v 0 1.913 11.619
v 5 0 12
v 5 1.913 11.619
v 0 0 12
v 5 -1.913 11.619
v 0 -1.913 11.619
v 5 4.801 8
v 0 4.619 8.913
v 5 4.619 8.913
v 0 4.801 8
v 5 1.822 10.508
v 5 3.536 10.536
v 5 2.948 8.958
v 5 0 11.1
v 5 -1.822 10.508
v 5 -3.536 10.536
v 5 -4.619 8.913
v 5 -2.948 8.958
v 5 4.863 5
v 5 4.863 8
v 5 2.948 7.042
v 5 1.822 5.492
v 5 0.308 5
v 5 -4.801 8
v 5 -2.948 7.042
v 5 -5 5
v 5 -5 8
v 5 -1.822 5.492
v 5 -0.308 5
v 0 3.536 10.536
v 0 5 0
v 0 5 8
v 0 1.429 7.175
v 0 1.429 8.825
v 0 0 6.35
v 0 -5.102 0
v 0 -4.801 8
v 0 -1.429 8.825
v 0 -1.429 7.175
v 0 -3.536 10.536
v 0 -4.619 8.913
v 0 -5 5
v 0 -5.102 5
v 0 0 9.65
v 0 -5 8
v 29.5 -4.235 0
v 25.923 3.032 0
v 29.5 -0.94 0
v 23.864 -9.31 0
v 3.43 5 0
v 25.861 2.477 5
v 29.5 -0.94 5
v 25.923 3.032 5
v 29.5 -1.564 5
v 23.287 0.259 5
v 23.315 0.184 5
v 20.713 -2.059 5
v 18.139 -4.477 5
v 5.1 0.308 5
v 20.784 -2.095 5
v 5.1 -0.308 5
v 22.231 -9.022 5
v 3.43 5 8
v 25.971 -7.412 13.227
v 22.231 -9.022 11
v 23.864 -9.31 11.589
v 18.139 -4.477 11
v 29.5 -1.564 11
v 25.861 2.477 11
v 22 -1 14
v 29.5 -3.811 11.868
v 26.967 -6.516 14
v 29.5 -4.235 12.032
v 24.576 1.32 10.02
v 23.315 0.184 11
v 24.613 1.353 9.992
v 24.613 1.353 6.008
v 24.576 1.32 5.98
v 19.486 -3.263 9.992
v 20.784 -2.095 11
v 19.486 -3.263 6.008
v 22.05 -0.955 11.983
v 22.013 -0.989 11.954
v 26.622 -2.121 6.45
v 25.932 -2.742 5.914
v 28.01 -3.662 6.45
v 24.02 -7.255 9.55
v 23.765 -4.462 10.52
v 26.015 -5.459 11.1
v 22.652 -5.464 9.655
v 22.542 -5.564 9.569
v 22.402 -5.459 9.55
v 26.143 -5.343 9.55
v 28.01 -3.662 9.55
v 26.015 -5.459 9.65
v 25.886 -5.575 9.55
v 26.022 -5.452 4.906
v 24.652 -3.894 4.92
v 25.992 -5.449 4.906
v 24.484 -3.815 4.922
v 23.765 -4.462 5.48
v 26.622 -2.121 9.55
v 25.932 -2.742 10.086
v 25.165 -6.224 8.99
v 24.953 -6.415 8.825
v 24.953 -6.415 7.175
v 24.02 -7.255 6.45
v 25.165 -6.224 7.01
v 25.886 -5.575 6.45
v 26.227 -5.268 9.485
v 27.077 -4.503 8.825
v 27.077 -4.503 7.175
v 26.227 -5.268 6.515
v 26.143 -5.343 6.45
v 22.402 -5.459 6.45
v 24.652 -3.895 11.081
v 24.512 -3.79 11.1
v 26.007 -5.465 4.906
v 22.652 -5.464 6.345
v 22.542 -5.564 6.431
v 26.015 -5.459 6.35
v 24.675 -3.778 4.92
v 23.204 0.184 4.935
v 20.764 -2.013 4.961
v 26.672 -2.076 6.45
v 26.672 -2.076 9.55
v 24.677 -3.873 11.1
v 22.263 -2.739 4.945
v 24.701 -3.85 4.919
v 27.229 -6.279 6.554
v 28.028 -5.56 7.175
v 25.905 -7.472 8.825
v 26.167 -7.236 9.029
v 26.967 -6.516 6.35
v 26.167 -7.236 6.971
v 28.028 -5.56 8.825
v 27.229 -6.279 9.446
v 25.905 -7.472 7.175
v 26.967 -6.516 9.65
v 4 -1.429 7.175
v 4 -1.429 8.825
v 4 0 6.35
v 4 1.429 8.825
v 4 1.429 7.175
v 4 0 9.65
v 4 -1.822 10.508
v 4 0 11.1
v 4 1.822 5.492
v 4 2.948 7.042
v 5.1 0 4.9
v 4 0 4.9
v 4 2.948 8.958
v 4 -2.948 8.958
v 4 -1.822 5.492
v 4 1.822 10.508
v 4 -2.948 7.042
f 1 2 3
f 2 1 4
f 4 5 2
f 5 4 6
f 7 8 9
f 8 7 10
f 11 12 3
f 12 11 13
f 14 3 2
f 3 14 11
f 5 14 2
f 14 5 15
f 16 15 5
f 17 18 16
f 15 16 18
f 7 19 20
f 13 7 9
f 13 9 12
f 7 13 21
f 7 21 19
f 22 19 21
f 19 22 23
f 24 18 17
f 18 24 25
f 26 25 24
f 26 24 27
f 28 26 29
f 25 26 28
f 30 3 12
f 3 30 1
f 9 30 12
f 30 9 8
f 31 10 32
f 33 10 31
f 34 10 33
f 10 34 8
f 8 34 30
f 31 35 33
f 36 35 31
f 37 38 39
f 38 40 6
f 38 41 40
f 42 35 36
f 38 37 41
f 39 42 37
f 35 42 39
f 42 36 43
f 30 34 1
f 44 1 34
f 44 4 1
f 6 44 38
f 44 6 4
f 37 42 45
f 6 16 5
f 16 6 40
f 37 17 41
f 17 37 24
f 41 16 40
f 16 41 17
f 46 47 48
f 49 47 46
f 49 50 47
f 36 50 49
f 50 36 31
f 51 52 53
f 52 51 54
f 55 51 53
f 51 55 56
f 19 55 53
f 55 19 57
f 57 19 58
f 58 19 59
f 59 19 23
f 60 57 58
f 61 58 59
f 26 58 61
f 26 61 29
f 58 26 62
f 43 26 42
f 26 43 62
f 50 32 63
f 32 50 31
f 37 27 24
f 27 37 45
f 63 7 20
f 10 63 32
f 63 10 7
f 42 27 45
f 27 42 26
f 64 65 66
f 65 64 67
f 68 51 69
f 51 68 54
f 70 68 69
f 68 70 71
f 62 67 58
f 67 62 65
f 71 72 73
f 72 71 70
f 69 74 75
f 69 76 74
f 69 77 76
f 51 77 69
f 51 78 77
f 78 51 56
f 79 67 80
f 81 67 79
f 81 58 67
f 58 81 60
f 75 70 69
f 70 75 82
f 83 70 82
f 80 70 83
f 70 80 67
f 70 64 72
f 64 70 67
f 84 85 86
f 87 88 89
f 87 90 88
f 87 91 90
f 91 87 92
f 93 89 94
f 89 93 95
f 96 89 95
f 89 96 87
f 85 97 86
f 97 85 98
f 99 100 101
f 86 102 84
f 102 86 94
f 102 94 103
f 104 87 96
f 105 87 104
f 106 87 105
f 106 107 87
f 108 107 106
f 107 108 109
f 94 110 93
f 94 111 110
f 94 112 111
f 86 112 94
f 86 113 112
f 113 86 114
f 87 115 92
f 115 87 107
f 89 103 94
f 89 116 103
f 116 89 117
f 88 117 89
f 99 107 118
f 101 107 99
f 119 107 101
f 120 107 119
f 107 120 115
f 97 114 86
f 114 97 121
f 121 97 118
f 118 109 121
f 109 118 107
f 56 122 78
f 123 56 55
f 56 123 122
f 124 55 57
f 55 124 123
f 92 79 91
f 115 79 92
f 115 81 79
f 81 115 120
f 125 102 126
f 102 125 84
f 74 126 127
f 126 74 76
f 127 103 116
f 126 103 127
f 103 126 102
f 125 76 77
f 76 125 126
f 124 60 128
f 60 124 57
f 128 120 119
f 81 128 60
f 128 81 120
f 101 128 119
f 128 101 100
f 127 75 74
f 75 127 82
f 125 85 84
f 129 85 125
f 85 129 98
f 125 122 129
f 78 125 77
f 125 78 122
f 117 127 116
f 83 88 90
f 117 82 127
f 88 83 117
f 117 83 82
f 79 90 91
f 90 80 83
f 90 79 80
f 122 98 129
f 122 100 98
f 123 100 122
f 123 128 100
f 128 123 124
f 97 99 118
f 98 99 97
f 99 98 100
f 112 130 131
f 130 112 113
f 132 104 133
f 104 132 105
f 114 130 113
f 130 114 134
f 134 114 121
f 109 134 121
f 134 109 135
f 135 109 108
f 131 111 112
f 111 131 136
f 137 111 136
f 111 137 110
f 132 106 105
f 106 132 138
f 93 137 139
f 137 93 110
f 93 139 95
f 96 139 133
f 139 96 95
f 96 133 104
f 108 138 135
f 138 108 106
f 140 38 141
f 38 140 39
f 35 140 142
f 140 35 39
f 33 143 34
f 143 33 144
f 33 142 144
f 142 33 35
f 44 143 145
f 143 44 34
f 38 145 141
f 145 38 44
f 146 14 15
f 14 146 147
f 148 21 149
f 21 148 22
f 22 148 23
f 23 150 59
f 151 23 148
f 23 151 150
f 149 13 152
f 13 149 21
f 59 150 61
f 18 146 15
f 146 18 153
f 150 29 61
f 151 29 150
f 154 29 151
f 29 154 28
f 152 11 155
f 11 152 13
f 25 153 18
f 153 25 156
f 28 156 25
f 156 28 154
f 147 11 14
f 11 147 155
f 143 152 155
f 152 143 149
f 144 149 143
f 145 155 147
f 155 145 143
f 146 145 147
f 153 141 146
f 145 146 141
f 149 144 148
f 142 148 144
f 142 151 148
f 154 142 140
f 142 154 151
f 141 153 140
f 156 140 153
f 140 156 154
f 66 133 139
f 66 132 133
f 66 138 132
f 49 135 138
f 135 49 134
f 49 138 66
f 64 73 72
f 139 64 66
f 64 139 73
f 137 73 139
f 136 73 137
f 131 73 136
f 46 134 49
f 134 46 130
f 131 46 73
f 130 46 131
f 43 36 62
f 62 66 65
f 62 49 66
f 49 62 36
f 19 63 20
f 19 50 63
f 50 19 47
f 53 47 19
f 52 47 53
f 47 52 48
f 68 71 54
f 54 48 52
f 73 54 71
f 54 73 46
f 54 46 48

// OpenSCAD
// PRUSA iteration4
// Print fan support
// GNU GPL v3
// Josef Průša <iam@josefprusa.cz> and contributors
// http://www.reprap.org/wiki/Prusa_Mendel
// http://prusamendel.org



translate([0, 0, 8])rotate([0, 90, 0])difference(){
	// base
    union(){
        translate([1,  0,0]) rotate([0,0,0])cylinder(h = 5, r=5);
        translate([3,-10,0]) rotate([0,0,0]) cube([5,15,30]);
        translate([0, -5,0]) rotate([0,0,0]) cube([8,10,5]);
        translate([0, -1,22]) rotate([48,0,0])cylinder(h = 10, r=6, $fn=6);
	}
	
	
    translate([0,-1,22]) rotate([48,0,0])cylinder(h = 30, r=1.65);
        
    difference(){
		// tapered hex hole 
        union(){
            translate([0, -1,22]) rotate([48,0,0])cylinder(h = 6, r=3.1, $fn=6);
            translate([0,-.9,22]) rotate([48,0,0])cylinder(h = 4, r2=3.1,r1=4, $fn=6);
        }
        translate([3,-8,17]) rotate([0,0.6,0]) cube([10,10,10]);
    }
   
   	// conterbored bolt hole
    translate([0,0,-13]) rotate([0,0,0])cylinder(h = 25, r=1.65);
    translate([0,0,4]) rotate([0,0,0])cylinder(h = 1.1, r=3.1);
    
    translate([15, -38,-8]) rotate([0,-48,90]) cube([60,50,20]);
    translate([-10,-24,-8]) rotate([10,0,0]) cube([50,20,40]);
    translate([-10,  6,-8]) rotate([5,0,0]) cube([50,20,40]);
    translate([-10,8.5,21]) rotate([48,0,0]) cube([20,20,20]);
    translate([-10,-13,29.5]) rotate([0,0,0]) cube([20,20,20]);
}
